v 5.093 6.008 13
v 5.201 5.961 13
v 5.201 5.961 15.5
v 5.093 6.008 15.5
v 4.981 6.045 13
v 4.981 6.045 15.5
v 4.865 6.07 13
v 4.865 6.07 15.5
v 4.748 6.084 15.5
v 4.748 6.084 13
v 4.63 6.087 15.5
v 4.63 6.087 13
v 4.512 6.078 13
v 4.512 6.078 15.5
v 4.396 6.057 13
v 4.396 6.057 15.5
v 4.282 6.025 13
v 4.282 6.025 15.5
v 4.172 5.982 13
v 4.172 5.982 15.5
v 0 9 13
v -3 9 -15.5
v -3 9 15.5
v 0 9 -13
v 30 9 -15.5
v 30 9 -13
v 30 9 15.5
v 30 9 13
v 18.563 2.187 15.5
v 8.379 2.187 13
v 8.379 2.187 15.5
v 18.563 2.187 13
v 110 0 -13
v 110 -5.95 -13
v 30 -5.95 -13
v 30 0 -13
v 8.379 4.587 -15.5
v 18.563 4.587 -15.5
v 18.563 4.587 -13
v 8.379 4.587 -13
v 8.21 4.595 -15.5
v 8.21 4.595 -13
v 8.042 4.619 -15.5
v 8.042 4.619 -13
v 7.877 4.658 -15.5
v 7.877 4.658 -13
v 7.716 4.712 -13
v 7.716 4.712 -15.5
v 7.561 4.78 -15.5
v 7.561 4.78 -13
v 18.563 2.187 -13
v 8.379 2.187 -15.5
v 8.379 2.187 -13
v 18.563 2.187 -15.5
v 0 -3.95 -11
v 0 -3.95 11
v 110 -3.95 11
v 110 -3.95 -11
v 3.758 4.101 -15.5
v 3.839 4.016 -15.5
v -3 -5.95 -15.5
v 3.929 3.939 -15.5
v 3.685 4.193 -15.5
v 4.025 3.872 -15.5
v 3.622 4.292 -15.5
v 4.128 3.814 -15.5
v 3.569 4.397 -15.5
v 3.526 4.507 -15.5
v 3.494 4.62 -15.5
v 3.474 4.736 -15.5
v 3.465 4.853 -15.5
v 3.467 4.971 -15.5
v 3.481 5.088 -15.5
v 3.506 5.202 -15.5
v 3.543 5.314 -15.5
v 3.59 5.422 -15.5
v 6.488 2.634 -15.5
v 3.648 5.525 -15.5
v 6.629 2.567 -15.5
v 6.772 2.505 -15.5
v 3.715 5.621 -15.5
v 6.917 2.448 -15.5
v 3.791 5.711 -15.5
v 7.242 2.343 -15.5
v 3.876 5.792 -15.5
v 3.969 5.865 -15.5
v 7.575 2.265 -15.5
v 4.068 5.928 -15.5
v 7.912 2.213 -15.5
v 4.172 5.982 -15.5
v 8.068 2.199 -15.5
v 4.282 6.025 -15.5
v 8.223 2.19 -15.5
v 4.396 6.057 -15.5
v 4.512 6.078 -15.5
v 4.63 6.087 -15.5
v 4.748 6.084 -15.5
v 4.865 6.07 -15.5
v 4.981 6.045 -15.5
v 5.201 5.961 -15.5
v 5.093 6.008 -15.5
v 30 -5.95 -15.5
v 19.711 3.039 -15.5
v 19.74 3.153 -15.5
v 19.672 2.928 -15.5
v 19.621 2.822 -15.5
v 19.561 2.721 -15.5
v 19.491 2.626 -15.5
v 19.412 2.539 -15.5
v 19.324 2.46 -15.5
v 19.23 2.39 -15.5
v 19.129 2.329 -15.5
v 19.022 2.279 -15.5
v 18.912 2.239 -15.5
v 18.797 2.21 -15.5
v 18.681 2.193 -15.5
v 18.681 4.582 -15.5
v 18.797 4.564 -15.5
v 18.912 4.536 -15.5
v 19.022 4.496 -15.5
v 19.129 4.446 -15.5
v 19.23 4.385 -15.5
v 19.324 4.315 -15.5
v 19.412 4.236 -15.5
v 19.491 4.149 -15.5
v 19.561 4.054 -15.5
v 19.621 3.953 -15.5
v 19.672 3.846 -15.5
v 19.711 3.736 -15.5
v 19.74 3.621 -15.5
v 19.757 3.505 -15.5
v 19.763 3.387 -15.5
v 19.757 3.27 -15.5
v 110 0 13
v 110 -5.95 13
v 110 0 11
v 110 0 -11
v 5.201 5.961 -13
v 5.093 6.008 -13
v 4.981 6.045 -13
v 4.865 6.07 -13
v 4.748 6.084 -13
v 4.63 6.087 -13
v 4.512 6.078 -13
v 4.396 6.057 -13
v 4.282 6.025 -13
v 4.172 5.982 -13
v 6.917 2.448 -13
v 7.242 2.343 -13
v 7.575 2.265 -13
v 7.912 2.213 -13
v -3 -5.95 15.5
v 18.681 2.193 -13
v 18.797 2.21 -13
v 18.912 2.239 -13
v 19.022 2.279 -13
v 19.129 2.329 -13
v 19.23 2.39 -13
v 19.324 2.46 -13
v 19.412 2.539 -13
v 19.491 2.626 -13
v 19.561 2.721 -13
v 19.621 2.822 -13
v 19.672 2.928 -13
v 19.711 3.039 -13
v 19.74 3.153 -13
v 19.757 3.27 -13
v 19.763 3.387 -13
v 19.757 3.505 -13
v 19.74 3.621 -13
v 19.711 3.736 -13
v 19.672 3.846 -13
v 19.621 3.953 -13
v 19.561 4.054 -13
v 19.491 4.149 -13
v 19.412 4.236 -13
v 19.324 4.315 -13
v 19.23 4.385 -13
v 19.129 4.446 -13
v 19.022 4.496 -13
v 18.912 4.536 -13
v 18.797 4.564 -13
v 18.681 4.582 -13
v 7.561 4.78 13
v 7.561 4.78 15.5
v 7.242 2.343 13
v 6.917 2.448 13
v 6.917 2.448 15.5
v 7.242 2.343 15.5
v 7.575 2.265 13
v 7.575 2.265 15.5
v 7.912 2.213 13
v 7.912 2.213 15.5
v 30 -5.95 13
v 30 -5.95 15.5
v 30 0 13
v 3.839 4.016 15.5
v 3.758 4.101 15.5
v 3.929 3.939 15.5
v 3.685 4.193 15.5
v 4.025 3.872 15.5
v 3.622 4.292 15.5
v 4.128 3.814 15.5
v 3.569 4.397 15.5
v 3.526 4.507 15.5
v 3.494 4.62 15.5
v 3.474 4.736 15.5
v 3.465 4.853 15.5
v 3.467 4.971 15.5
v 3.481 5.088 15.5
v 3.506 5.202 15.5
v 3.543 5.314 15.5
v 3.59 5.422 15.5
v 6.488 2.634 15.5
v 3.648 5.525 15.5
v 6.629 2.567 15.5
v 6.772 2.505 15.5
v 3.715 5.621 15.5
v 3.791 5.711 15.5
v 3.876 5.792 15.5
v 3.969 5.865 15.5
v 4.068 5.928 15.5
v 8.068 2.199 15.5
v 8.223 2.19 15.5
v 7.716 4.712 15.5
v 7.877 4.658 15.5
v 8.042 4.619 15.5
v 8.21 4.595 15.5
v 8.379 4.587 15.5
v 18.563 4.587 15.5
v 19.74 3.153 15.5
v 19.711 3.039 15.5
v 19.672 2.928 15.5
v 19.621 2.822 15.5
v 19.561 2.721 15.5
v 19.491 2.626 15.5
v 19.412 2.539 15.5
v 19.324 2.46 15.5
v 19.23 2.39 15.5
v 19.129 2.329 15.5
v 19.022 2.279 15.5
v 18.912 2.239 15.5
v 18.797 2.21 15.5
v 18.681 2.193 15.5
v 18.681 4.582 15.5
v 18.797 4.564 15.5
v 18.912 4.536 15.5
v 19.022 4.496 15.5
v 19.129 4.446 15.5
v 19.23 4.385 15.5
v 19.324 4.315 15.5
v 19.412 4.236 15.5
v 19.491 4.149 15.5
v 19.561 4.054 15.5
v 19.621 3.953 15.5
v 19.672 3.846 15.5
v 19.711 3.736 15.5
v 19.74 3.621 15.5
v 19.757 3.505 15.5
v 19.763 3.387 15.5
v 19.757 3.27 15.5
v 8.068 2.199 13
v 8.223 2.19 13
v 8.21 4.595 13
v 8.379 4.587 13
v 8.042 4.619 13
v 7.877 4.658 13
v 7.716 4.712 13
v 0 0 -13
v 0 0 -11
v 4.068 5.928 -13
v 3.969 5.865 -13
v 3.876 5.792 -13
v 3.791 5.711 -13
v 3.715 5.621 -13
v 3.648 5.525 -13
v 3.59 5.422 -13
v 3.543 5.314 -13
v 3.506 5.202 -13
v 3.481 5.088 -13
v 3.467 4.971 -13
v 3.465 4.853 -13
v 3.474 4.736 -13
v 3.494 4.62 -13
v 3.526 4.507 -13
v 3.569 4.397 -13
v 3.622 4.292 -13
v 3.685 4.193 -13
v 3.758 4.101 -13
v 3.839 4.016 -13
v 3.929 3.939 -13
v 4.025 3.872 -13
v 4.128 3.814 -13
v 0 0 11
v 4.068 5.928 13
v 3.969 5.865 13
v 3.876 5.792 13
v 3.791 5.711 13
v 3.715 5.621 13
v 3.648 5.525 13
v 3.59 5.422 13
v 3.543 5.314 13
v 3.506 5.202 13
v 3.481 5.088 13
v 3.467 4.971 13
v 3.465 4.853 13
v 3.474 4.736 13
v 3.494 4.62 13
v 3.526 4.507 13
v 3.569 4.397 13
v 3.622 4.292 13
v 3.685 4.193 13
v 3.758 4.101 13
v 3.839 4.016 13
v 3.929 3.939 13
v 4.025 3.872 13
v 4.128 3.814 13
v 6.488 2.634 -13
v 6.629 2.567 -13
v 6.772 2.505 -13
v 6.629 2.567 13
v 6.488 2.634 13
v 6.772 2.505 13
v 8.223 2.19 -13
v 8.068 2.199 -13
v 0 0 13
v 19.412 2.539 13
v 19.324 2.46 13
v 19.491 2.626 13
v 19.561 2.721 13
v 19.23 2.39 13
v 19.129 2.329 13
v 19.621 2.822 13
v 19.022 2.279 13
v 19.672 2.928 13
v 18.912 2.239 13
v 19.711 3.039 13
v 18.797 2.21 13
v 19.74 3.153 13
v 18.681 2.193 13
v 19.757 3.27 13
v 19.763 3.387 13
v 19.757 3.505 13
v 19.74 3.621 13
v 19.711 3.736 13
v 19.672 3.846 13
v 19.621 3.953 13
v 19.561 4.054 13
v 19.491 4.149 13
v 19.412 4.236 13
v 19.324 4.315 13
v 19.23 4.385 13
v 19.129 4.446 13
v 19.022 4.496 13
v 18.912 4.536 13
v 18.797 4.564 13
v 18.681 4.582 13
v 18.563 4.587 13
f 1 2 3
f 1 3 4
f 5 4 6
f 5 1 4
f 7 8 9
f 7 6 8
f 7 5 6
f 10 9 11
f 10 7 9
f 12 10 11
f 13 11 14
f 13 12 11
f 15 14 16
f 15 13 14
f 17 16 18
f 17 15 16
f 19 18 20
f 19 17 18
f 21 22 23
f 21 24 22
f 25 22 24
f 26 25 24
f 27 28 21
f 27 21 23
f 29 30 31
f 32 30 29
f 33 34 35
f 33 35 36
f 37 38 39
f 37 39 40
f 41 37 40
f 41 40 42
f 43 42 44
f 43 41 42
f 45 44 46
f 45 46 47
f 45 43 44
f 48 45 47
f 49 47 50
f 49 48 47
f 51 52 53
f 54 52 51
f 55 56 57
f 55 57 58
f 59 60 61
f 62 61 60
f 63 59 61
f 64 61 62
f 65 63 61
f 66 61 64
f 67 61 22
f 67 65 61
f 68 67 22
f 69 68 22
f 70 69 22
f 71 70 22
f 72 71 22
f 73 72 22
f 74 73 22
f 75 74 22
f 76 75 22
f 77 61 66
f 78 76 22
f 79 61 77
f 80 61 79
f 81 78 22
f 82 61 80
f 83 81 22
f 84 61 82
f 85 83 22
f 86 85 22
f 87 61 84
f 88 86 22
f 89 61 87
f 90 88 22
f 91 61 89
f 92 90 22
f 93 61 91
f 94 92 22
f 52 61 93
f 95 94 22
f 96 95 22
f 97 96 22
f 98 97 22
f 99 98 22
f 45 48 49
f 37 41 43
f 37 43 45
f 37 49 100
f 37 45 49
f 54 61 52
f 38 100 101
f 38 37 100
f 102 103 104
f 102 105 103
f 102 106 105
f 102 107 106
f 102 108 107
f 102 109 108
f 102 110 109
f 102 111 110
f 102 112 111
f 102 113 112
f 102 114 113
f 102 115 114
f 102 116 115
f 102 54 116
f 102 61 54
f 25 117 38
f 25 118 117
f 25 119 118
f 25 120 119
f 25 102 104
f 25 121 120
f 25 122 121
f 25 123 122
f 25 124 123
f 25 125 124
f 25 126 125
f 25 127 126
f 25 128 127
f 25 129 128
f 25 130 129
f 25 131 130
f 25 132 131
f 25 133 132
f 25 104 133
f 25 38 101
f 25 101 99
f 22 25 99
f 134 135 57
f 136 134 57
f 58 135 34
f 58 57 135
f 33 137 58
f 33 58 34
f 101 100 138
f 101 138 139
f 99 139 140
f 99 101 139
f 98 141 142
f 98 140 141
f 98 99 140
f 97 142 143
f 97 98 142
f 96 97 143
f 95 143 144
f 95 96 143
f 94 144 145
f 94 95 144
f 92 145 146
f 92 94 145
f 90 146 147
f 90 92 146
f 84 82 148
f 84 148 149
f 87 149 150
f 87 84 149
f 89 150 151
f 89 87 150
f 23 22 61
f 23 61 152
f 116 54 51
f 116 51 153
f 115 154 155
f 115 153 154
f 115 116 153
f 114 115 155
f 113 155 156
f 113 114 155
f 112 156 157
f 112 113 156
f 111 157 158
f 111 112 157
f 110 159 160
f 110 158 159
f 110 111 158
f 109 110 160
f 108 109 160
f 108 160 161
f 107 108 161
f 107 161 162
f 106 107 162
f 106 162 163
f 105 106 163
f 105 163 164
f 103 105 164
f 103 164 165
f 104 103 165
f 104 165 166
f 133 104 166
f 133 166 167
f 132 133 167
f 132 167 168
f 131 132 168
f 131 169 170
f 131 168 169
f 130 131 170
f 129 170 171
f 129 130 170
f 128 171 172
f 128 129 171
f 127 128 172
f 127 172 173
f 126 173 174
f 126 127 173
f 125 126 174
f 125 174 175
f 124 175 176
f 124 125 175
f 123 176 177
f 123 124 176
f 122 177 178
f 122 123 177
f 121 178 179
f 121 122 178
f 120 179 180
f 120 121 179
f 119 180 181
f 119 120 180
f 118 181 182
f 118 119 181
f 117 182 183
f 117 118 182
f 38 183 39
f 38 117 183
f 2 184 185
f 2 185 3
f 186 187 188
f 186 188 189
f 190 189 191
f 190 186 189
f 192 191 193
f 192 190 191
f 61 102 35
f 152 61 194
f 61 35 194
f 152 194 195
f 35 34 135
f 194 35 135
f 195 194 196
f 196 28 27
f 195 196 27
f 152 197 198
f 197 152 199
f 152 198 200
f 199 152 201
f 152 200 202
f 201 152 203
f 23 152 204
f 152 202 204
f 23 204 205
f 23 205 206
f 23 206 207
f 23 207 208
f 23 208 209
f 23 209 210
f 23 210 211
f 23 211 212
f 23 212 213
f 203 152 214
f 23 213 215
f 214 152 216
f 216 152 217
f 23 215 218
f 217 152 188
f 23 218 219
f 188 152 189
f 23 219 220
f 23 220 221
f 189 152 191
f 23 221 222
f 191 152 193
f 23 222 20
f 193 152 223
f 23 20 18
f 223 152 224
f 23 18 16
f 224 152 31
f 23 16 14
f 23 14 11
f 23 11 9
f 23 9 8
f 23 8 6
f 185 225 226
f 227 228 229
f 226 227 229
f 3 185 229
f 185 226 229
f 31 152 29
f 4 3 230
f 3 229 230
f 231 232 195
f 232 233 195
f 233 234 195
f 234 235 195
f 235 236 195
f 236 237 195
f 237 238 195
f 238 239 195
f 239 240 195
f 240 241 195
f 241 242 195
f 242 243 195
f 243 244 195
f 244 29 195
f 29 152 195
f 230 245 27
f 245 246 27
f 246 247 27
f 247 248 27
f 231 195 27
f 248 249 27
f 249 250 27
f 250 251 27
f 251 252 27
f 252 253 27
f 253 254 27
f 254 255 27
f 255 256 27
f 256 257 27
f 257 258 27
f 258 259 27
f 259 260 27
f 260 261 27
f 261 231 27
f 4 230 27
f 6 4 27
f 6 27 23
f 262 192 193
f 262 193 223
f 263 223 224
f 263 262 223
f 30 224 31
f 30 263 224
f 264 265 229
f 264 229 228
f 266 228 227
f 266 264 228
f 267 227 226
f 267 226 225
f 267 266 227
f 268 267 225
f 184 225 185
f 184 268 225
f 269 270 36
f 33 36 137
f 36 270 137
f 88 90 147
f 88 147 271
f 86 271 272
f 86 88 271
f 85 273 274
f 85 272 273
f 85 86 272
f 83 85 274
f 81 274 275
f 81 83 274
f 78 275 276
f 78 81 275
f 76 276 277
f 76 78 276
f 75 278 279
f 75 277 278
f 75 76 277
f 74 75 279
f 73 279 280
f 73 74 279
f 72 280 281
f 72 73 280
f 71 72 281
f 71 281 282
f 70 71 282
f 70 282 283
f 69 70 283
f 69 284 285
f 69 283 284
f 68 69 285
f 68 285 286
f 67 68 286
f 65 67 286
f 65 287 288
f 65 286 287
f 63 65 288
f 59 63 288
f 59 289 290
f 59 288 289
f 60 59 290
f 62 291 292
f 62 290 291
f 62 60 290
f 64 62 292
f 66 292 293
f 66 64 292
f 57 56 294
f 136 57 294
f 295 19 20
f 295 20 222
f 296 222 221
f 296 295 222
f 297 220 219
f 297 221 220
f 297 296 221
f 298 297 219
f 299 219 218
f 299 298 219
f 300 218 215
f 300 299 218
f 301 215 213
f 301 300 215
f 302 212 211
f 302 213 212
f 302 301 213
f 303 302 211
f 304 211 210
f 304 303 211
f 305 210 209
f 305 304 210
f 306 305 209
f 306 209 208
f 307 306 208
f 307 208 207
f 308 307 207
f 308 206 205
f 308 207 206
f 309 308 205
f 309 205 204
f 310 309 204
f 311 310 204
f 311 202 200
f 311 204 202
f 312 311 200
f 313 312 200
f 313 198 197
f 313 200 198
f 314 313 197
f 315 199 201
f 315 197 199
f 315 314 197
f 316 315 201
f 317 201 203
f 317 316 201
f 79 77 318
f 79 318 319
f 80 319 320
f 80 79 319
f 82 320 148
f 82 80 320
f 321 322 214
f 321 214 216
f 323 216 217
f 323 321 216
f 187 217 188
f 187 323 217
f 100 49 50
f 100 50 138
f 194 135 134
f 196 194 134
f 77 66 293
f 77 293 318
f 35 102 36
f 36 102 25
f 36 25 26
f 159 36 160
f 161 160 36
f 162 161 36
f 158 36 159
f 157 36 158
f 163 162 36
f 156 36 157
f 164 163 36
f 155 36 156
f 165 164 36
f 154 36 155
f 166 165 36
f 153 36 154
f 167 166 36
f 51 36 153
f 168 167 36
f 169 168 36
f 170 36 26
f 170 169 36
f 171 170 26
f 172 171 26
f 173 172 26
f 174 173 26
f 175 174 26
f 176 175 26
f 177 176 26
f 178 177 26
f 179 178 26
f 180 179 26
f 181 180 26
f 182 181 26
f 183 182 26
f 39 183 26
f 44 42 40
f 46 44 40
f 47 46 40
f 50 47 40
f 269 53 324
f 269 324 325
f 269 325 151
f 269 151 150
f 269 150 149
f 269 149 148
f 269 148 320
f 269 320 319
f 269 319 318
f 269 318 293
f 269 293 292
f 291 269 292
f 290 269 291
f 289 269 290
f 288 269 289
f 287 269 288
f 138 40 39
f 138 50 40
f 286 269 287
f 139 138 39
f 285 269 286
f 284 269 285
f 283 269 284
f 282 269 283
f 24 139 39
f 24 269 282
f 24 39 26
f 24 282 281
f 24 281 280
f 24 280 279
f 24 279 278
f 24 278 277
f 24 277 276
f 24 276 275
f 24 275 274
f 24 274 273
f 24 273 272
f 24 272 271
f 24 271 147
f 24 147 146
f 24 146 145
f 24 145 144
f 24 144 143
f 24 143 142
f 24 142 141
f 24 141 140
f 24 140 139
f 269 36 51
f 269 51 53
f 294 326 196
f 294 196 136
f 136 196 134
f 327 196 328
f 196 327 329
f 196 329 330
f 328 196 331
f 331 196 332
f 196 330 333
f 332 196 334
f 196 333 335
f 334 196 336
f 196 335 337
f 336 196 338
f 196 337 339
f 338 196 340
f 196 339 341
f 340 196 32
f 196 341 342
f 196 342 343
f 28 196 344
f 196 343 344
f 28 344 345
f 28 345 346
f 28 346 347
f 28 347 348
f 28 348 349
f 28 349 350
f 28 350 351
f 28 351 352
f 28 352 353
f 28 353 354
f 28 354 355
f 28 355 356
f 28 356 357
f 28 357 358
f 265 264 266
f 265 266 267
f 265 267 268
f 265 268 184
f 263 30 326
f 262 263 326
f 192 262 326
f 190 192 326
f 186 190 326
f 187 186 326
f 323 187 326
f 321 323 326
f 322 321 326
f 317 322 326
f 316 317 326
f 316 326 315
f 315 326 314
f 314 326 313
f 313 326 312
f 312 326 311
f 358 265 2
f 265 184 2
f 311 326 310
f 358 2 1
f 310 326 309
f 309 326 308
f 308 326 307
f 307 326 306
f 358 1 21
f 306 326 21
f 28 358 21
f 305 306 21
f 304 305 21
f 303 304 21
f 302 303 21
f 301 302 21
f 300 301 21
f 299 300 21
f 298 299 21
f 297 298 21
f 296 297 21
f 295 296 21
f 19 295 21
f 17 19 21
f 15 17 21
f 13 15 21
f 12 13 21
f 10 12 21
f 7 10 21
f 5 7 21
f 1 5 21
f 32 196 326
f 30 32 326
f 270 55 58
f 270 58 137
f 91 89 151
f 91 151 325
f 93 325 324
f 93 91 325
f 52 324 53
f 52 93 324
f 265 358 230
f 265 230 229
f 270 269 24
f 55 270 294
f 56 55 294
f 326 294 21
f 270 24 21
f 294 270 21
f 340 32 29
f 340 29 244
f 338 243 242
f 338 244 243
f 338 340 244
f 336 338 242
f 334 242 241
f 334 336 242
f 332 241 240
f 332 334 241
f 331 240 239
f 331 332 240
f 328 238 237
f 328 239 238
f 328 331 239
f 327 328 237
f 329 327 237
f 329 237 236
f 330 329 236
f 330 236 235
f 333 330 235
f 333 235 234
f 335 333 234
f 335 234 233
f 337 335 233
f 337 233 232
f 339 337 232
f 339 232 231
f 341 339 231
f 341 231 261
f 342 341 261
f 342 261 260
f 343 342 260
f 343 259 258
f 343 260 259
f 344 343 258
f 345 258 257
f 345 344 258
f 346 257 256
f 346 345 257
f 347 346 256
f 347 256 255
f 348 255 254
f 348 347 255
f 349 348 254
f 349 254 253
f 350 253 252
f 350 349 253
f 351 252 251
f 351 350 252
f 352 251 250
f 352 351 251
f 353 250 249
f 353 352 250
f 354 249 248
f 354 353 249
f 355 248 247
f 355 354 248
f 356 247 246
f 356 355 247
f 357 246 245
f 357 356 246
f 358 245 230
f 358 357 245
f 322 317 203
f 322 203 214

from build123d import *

# Parameters (mm, degrees)
SKETCH_1_W               = 26
SKETCH_1_H               = 11.9
SKETCH_1_W_2             = 22
SKETCH_1_H_2             = 7.9
EXTRUDE_1_DEPTH          = 110
SKETCH_3_W               = 151.071145041
SKETCH_3_H               = 8.521608695
CUT_EXTRUDE_1_DEPTH      = 50
SKETCH_4_W               = 2.5
SKETCH_4_H               = 14.950427865
EXTRUDE_2_DEPTH          = 30
SKETCH_5_W               = 31
SKETCH_5_H               = 14.950427865
EXTRUDE_3_DEPTH          = 3
CUT_EXTRUDE_2_DEPTH      = 114.987971742
CUT_EXTRUDE_2_DEPTH_BACK = 10


with BuildPart() as part:
    # 草图1 → 凸台-拉伸1 (new body)
    with BuildSketch(Plane(origin=(0, 0, 0), x_dir=(0, 0, -1), z_dir=(1, 0, 0))):
        Rectangle(SKETCH_1_W, SKETCH_1_H)
        Rectangle(SKETCH_1_W_2, SKETCH_1_H_2, mode=Mode.SUBTRACT)
    extrude(amount=EXTRUDE_1_DEPTH)

    # 草图3 → 切除-拉伸1 (cut)
    with BuildSketch(Plane.XY.offset(13)):
        with Locations((72.322087123, 4.260804348)):
            Rectangle(SKETCH_3_W, SKETCH_3_H)
    extrude(amount=-CUT_EXTRUDE_1_DEPTH, mode=Mode.SUBTRACT)

    # 草图4 → 凸台-拉伸2 (add)
    with BuildSketch(Plane.ZY):
        with Locations((14.25, 1.525213933)):
            Rectangle(SKETCH_4_W, SKETCH_4_H)
        with Locations((-14.25, 1.525213933)):
            Rectangle(SKETCH_4_W, SKETCH_4_H)
    extrude(amount=-EXTRUDE_2_DEPTH)

    # 草图5 → 凸台-拉伸3 (add)
    with BuildSketch(Plane.ZY):
        with Locations((0, 1.525213933)):
            Rectangle(SKETCH_5_W, SKETCH_5_H)
    extrude(amount=EXTRUDE_3_DEPTH)

    # 草图6 → 切除-拉伸2 (cut, two sides: drawn at the far end of the back side and taken through both)
    with BuildSketch(Plane.XY.offset(-13).offset(-CUT_EXTRUDE_2_DEPTH_BACK)):
        with BuildLine():
            Line((18.563166245, 4.587279606), (12.192847179, 4.587279606))
            ThreePointArc((12.192847179, 4.587279606), (10.632355173, 2.837216293), (8.379481629, 2.187279606))
            Line((8.379481629, 2.187279606), (18.563166245, 2.187279606))
            ThreePointArc((18.563166245, 2.187279606), (19.763166245, 3.387279606), (18.563166245, 4.587279606))
        make_face()
        with BuildLine():
            Line((8.379481629, 4.587279606), (7.947587552, 4.587279606))
            Line((7.947587552, 4.587279606), (8.200962294, 4.460592236))
            ThreePointArc((8.200962294, 4.460592236), (8.854523462, 3.234366745), (7.912225197, 2.213168853))
            ThreePointArc((7.912225197, 2.213168853), (8.145495077, 2.193756878), (8.379481629, 2.187279606))
            ThreePointArc((8.379481629, 2.187279606), (10.632355173, 2.837216293), (12.192847179, 4.587279606))
            Line((12.192847179, 4.587279606), (8.379481629, 4.587279606))
        make_face()
        with BuildLine():
            Line((7.561289802, 4.780428481), (5.200962294, 5.960592236))
            ThreePointArc((5.200962294, 5.960592236), (4.689059665, 6.087024269), (4.172377695, 5.981814468))
            ThreePointArc((4.172377695, 5.981814468), (4.900896967, 4.01090385), (6.487977015, 2.633803302))
            ThreePointArc((6.487977015, 2.633803302), (6.700157723, 2.534954754), (6.917481998, 2.447995868))
            ThreePointArc((6.917481998, 2.447995868), (6.531358389, 3.782791625), (7.664305979, 4.587279606))
            Line((7.664305979, 4.587279606), (7.947587552, 4.587279606))
            Line((7.947587552, 4.587279606), (7.561289802, 4.780428481))
        make_face()
        with BuildLine():
            ThreePointArc((8.379481629, 4.587279606), (7.959141186, 4.636221447), (7.561289802, 4.780428481))
            Line((7.561289802, 4.780428481), (7.947587552, 4.587279606))
            Line((7.947587552, 4.587279606), (8.379481629, 4.587279606))
        make_face()
        with BuildLine():
            ThreePointArc((6.487977015, 2.633803302), (4.900896967, 4.01090385), (4.172377695, 5.981814468))
            ThreePointArc((4.172377695, 5.981814468), (3.464561317, 4.912033292), (4.127649665, 3.813966977))
            Line((4.127649665, 3.813966977), (6.487977015, 2.633803302))
        make_face()
        with BuildLine():
            Line((8.200962294, 4.460592236), (7.947587552, 4.587279606))
            Line((7.947587552, 4.587279606), (7.664305979, 4.587279606))
            ThreePointArc((7.664305979, 4.587279606), (6.531358389, 3.782791625), (6.917481998, 2.447995868))
            ThreePointArc((6.917481998, 2.447995868), (7.407734146, 2.300423879), (7.912225197, 2.213168853))
            ThreePointArc((7.912225197, 2.213168853), (8.854523462, 3.234366745), (8.200962294, 4.460592236))
        make_face()
    extrude(amount=CUT_EXTRUDE_2_DEPTH + CUT_EXTRUDE_2_DEPTH_BACK, mode=Mode.SUBTRACT)


solid = part.part
